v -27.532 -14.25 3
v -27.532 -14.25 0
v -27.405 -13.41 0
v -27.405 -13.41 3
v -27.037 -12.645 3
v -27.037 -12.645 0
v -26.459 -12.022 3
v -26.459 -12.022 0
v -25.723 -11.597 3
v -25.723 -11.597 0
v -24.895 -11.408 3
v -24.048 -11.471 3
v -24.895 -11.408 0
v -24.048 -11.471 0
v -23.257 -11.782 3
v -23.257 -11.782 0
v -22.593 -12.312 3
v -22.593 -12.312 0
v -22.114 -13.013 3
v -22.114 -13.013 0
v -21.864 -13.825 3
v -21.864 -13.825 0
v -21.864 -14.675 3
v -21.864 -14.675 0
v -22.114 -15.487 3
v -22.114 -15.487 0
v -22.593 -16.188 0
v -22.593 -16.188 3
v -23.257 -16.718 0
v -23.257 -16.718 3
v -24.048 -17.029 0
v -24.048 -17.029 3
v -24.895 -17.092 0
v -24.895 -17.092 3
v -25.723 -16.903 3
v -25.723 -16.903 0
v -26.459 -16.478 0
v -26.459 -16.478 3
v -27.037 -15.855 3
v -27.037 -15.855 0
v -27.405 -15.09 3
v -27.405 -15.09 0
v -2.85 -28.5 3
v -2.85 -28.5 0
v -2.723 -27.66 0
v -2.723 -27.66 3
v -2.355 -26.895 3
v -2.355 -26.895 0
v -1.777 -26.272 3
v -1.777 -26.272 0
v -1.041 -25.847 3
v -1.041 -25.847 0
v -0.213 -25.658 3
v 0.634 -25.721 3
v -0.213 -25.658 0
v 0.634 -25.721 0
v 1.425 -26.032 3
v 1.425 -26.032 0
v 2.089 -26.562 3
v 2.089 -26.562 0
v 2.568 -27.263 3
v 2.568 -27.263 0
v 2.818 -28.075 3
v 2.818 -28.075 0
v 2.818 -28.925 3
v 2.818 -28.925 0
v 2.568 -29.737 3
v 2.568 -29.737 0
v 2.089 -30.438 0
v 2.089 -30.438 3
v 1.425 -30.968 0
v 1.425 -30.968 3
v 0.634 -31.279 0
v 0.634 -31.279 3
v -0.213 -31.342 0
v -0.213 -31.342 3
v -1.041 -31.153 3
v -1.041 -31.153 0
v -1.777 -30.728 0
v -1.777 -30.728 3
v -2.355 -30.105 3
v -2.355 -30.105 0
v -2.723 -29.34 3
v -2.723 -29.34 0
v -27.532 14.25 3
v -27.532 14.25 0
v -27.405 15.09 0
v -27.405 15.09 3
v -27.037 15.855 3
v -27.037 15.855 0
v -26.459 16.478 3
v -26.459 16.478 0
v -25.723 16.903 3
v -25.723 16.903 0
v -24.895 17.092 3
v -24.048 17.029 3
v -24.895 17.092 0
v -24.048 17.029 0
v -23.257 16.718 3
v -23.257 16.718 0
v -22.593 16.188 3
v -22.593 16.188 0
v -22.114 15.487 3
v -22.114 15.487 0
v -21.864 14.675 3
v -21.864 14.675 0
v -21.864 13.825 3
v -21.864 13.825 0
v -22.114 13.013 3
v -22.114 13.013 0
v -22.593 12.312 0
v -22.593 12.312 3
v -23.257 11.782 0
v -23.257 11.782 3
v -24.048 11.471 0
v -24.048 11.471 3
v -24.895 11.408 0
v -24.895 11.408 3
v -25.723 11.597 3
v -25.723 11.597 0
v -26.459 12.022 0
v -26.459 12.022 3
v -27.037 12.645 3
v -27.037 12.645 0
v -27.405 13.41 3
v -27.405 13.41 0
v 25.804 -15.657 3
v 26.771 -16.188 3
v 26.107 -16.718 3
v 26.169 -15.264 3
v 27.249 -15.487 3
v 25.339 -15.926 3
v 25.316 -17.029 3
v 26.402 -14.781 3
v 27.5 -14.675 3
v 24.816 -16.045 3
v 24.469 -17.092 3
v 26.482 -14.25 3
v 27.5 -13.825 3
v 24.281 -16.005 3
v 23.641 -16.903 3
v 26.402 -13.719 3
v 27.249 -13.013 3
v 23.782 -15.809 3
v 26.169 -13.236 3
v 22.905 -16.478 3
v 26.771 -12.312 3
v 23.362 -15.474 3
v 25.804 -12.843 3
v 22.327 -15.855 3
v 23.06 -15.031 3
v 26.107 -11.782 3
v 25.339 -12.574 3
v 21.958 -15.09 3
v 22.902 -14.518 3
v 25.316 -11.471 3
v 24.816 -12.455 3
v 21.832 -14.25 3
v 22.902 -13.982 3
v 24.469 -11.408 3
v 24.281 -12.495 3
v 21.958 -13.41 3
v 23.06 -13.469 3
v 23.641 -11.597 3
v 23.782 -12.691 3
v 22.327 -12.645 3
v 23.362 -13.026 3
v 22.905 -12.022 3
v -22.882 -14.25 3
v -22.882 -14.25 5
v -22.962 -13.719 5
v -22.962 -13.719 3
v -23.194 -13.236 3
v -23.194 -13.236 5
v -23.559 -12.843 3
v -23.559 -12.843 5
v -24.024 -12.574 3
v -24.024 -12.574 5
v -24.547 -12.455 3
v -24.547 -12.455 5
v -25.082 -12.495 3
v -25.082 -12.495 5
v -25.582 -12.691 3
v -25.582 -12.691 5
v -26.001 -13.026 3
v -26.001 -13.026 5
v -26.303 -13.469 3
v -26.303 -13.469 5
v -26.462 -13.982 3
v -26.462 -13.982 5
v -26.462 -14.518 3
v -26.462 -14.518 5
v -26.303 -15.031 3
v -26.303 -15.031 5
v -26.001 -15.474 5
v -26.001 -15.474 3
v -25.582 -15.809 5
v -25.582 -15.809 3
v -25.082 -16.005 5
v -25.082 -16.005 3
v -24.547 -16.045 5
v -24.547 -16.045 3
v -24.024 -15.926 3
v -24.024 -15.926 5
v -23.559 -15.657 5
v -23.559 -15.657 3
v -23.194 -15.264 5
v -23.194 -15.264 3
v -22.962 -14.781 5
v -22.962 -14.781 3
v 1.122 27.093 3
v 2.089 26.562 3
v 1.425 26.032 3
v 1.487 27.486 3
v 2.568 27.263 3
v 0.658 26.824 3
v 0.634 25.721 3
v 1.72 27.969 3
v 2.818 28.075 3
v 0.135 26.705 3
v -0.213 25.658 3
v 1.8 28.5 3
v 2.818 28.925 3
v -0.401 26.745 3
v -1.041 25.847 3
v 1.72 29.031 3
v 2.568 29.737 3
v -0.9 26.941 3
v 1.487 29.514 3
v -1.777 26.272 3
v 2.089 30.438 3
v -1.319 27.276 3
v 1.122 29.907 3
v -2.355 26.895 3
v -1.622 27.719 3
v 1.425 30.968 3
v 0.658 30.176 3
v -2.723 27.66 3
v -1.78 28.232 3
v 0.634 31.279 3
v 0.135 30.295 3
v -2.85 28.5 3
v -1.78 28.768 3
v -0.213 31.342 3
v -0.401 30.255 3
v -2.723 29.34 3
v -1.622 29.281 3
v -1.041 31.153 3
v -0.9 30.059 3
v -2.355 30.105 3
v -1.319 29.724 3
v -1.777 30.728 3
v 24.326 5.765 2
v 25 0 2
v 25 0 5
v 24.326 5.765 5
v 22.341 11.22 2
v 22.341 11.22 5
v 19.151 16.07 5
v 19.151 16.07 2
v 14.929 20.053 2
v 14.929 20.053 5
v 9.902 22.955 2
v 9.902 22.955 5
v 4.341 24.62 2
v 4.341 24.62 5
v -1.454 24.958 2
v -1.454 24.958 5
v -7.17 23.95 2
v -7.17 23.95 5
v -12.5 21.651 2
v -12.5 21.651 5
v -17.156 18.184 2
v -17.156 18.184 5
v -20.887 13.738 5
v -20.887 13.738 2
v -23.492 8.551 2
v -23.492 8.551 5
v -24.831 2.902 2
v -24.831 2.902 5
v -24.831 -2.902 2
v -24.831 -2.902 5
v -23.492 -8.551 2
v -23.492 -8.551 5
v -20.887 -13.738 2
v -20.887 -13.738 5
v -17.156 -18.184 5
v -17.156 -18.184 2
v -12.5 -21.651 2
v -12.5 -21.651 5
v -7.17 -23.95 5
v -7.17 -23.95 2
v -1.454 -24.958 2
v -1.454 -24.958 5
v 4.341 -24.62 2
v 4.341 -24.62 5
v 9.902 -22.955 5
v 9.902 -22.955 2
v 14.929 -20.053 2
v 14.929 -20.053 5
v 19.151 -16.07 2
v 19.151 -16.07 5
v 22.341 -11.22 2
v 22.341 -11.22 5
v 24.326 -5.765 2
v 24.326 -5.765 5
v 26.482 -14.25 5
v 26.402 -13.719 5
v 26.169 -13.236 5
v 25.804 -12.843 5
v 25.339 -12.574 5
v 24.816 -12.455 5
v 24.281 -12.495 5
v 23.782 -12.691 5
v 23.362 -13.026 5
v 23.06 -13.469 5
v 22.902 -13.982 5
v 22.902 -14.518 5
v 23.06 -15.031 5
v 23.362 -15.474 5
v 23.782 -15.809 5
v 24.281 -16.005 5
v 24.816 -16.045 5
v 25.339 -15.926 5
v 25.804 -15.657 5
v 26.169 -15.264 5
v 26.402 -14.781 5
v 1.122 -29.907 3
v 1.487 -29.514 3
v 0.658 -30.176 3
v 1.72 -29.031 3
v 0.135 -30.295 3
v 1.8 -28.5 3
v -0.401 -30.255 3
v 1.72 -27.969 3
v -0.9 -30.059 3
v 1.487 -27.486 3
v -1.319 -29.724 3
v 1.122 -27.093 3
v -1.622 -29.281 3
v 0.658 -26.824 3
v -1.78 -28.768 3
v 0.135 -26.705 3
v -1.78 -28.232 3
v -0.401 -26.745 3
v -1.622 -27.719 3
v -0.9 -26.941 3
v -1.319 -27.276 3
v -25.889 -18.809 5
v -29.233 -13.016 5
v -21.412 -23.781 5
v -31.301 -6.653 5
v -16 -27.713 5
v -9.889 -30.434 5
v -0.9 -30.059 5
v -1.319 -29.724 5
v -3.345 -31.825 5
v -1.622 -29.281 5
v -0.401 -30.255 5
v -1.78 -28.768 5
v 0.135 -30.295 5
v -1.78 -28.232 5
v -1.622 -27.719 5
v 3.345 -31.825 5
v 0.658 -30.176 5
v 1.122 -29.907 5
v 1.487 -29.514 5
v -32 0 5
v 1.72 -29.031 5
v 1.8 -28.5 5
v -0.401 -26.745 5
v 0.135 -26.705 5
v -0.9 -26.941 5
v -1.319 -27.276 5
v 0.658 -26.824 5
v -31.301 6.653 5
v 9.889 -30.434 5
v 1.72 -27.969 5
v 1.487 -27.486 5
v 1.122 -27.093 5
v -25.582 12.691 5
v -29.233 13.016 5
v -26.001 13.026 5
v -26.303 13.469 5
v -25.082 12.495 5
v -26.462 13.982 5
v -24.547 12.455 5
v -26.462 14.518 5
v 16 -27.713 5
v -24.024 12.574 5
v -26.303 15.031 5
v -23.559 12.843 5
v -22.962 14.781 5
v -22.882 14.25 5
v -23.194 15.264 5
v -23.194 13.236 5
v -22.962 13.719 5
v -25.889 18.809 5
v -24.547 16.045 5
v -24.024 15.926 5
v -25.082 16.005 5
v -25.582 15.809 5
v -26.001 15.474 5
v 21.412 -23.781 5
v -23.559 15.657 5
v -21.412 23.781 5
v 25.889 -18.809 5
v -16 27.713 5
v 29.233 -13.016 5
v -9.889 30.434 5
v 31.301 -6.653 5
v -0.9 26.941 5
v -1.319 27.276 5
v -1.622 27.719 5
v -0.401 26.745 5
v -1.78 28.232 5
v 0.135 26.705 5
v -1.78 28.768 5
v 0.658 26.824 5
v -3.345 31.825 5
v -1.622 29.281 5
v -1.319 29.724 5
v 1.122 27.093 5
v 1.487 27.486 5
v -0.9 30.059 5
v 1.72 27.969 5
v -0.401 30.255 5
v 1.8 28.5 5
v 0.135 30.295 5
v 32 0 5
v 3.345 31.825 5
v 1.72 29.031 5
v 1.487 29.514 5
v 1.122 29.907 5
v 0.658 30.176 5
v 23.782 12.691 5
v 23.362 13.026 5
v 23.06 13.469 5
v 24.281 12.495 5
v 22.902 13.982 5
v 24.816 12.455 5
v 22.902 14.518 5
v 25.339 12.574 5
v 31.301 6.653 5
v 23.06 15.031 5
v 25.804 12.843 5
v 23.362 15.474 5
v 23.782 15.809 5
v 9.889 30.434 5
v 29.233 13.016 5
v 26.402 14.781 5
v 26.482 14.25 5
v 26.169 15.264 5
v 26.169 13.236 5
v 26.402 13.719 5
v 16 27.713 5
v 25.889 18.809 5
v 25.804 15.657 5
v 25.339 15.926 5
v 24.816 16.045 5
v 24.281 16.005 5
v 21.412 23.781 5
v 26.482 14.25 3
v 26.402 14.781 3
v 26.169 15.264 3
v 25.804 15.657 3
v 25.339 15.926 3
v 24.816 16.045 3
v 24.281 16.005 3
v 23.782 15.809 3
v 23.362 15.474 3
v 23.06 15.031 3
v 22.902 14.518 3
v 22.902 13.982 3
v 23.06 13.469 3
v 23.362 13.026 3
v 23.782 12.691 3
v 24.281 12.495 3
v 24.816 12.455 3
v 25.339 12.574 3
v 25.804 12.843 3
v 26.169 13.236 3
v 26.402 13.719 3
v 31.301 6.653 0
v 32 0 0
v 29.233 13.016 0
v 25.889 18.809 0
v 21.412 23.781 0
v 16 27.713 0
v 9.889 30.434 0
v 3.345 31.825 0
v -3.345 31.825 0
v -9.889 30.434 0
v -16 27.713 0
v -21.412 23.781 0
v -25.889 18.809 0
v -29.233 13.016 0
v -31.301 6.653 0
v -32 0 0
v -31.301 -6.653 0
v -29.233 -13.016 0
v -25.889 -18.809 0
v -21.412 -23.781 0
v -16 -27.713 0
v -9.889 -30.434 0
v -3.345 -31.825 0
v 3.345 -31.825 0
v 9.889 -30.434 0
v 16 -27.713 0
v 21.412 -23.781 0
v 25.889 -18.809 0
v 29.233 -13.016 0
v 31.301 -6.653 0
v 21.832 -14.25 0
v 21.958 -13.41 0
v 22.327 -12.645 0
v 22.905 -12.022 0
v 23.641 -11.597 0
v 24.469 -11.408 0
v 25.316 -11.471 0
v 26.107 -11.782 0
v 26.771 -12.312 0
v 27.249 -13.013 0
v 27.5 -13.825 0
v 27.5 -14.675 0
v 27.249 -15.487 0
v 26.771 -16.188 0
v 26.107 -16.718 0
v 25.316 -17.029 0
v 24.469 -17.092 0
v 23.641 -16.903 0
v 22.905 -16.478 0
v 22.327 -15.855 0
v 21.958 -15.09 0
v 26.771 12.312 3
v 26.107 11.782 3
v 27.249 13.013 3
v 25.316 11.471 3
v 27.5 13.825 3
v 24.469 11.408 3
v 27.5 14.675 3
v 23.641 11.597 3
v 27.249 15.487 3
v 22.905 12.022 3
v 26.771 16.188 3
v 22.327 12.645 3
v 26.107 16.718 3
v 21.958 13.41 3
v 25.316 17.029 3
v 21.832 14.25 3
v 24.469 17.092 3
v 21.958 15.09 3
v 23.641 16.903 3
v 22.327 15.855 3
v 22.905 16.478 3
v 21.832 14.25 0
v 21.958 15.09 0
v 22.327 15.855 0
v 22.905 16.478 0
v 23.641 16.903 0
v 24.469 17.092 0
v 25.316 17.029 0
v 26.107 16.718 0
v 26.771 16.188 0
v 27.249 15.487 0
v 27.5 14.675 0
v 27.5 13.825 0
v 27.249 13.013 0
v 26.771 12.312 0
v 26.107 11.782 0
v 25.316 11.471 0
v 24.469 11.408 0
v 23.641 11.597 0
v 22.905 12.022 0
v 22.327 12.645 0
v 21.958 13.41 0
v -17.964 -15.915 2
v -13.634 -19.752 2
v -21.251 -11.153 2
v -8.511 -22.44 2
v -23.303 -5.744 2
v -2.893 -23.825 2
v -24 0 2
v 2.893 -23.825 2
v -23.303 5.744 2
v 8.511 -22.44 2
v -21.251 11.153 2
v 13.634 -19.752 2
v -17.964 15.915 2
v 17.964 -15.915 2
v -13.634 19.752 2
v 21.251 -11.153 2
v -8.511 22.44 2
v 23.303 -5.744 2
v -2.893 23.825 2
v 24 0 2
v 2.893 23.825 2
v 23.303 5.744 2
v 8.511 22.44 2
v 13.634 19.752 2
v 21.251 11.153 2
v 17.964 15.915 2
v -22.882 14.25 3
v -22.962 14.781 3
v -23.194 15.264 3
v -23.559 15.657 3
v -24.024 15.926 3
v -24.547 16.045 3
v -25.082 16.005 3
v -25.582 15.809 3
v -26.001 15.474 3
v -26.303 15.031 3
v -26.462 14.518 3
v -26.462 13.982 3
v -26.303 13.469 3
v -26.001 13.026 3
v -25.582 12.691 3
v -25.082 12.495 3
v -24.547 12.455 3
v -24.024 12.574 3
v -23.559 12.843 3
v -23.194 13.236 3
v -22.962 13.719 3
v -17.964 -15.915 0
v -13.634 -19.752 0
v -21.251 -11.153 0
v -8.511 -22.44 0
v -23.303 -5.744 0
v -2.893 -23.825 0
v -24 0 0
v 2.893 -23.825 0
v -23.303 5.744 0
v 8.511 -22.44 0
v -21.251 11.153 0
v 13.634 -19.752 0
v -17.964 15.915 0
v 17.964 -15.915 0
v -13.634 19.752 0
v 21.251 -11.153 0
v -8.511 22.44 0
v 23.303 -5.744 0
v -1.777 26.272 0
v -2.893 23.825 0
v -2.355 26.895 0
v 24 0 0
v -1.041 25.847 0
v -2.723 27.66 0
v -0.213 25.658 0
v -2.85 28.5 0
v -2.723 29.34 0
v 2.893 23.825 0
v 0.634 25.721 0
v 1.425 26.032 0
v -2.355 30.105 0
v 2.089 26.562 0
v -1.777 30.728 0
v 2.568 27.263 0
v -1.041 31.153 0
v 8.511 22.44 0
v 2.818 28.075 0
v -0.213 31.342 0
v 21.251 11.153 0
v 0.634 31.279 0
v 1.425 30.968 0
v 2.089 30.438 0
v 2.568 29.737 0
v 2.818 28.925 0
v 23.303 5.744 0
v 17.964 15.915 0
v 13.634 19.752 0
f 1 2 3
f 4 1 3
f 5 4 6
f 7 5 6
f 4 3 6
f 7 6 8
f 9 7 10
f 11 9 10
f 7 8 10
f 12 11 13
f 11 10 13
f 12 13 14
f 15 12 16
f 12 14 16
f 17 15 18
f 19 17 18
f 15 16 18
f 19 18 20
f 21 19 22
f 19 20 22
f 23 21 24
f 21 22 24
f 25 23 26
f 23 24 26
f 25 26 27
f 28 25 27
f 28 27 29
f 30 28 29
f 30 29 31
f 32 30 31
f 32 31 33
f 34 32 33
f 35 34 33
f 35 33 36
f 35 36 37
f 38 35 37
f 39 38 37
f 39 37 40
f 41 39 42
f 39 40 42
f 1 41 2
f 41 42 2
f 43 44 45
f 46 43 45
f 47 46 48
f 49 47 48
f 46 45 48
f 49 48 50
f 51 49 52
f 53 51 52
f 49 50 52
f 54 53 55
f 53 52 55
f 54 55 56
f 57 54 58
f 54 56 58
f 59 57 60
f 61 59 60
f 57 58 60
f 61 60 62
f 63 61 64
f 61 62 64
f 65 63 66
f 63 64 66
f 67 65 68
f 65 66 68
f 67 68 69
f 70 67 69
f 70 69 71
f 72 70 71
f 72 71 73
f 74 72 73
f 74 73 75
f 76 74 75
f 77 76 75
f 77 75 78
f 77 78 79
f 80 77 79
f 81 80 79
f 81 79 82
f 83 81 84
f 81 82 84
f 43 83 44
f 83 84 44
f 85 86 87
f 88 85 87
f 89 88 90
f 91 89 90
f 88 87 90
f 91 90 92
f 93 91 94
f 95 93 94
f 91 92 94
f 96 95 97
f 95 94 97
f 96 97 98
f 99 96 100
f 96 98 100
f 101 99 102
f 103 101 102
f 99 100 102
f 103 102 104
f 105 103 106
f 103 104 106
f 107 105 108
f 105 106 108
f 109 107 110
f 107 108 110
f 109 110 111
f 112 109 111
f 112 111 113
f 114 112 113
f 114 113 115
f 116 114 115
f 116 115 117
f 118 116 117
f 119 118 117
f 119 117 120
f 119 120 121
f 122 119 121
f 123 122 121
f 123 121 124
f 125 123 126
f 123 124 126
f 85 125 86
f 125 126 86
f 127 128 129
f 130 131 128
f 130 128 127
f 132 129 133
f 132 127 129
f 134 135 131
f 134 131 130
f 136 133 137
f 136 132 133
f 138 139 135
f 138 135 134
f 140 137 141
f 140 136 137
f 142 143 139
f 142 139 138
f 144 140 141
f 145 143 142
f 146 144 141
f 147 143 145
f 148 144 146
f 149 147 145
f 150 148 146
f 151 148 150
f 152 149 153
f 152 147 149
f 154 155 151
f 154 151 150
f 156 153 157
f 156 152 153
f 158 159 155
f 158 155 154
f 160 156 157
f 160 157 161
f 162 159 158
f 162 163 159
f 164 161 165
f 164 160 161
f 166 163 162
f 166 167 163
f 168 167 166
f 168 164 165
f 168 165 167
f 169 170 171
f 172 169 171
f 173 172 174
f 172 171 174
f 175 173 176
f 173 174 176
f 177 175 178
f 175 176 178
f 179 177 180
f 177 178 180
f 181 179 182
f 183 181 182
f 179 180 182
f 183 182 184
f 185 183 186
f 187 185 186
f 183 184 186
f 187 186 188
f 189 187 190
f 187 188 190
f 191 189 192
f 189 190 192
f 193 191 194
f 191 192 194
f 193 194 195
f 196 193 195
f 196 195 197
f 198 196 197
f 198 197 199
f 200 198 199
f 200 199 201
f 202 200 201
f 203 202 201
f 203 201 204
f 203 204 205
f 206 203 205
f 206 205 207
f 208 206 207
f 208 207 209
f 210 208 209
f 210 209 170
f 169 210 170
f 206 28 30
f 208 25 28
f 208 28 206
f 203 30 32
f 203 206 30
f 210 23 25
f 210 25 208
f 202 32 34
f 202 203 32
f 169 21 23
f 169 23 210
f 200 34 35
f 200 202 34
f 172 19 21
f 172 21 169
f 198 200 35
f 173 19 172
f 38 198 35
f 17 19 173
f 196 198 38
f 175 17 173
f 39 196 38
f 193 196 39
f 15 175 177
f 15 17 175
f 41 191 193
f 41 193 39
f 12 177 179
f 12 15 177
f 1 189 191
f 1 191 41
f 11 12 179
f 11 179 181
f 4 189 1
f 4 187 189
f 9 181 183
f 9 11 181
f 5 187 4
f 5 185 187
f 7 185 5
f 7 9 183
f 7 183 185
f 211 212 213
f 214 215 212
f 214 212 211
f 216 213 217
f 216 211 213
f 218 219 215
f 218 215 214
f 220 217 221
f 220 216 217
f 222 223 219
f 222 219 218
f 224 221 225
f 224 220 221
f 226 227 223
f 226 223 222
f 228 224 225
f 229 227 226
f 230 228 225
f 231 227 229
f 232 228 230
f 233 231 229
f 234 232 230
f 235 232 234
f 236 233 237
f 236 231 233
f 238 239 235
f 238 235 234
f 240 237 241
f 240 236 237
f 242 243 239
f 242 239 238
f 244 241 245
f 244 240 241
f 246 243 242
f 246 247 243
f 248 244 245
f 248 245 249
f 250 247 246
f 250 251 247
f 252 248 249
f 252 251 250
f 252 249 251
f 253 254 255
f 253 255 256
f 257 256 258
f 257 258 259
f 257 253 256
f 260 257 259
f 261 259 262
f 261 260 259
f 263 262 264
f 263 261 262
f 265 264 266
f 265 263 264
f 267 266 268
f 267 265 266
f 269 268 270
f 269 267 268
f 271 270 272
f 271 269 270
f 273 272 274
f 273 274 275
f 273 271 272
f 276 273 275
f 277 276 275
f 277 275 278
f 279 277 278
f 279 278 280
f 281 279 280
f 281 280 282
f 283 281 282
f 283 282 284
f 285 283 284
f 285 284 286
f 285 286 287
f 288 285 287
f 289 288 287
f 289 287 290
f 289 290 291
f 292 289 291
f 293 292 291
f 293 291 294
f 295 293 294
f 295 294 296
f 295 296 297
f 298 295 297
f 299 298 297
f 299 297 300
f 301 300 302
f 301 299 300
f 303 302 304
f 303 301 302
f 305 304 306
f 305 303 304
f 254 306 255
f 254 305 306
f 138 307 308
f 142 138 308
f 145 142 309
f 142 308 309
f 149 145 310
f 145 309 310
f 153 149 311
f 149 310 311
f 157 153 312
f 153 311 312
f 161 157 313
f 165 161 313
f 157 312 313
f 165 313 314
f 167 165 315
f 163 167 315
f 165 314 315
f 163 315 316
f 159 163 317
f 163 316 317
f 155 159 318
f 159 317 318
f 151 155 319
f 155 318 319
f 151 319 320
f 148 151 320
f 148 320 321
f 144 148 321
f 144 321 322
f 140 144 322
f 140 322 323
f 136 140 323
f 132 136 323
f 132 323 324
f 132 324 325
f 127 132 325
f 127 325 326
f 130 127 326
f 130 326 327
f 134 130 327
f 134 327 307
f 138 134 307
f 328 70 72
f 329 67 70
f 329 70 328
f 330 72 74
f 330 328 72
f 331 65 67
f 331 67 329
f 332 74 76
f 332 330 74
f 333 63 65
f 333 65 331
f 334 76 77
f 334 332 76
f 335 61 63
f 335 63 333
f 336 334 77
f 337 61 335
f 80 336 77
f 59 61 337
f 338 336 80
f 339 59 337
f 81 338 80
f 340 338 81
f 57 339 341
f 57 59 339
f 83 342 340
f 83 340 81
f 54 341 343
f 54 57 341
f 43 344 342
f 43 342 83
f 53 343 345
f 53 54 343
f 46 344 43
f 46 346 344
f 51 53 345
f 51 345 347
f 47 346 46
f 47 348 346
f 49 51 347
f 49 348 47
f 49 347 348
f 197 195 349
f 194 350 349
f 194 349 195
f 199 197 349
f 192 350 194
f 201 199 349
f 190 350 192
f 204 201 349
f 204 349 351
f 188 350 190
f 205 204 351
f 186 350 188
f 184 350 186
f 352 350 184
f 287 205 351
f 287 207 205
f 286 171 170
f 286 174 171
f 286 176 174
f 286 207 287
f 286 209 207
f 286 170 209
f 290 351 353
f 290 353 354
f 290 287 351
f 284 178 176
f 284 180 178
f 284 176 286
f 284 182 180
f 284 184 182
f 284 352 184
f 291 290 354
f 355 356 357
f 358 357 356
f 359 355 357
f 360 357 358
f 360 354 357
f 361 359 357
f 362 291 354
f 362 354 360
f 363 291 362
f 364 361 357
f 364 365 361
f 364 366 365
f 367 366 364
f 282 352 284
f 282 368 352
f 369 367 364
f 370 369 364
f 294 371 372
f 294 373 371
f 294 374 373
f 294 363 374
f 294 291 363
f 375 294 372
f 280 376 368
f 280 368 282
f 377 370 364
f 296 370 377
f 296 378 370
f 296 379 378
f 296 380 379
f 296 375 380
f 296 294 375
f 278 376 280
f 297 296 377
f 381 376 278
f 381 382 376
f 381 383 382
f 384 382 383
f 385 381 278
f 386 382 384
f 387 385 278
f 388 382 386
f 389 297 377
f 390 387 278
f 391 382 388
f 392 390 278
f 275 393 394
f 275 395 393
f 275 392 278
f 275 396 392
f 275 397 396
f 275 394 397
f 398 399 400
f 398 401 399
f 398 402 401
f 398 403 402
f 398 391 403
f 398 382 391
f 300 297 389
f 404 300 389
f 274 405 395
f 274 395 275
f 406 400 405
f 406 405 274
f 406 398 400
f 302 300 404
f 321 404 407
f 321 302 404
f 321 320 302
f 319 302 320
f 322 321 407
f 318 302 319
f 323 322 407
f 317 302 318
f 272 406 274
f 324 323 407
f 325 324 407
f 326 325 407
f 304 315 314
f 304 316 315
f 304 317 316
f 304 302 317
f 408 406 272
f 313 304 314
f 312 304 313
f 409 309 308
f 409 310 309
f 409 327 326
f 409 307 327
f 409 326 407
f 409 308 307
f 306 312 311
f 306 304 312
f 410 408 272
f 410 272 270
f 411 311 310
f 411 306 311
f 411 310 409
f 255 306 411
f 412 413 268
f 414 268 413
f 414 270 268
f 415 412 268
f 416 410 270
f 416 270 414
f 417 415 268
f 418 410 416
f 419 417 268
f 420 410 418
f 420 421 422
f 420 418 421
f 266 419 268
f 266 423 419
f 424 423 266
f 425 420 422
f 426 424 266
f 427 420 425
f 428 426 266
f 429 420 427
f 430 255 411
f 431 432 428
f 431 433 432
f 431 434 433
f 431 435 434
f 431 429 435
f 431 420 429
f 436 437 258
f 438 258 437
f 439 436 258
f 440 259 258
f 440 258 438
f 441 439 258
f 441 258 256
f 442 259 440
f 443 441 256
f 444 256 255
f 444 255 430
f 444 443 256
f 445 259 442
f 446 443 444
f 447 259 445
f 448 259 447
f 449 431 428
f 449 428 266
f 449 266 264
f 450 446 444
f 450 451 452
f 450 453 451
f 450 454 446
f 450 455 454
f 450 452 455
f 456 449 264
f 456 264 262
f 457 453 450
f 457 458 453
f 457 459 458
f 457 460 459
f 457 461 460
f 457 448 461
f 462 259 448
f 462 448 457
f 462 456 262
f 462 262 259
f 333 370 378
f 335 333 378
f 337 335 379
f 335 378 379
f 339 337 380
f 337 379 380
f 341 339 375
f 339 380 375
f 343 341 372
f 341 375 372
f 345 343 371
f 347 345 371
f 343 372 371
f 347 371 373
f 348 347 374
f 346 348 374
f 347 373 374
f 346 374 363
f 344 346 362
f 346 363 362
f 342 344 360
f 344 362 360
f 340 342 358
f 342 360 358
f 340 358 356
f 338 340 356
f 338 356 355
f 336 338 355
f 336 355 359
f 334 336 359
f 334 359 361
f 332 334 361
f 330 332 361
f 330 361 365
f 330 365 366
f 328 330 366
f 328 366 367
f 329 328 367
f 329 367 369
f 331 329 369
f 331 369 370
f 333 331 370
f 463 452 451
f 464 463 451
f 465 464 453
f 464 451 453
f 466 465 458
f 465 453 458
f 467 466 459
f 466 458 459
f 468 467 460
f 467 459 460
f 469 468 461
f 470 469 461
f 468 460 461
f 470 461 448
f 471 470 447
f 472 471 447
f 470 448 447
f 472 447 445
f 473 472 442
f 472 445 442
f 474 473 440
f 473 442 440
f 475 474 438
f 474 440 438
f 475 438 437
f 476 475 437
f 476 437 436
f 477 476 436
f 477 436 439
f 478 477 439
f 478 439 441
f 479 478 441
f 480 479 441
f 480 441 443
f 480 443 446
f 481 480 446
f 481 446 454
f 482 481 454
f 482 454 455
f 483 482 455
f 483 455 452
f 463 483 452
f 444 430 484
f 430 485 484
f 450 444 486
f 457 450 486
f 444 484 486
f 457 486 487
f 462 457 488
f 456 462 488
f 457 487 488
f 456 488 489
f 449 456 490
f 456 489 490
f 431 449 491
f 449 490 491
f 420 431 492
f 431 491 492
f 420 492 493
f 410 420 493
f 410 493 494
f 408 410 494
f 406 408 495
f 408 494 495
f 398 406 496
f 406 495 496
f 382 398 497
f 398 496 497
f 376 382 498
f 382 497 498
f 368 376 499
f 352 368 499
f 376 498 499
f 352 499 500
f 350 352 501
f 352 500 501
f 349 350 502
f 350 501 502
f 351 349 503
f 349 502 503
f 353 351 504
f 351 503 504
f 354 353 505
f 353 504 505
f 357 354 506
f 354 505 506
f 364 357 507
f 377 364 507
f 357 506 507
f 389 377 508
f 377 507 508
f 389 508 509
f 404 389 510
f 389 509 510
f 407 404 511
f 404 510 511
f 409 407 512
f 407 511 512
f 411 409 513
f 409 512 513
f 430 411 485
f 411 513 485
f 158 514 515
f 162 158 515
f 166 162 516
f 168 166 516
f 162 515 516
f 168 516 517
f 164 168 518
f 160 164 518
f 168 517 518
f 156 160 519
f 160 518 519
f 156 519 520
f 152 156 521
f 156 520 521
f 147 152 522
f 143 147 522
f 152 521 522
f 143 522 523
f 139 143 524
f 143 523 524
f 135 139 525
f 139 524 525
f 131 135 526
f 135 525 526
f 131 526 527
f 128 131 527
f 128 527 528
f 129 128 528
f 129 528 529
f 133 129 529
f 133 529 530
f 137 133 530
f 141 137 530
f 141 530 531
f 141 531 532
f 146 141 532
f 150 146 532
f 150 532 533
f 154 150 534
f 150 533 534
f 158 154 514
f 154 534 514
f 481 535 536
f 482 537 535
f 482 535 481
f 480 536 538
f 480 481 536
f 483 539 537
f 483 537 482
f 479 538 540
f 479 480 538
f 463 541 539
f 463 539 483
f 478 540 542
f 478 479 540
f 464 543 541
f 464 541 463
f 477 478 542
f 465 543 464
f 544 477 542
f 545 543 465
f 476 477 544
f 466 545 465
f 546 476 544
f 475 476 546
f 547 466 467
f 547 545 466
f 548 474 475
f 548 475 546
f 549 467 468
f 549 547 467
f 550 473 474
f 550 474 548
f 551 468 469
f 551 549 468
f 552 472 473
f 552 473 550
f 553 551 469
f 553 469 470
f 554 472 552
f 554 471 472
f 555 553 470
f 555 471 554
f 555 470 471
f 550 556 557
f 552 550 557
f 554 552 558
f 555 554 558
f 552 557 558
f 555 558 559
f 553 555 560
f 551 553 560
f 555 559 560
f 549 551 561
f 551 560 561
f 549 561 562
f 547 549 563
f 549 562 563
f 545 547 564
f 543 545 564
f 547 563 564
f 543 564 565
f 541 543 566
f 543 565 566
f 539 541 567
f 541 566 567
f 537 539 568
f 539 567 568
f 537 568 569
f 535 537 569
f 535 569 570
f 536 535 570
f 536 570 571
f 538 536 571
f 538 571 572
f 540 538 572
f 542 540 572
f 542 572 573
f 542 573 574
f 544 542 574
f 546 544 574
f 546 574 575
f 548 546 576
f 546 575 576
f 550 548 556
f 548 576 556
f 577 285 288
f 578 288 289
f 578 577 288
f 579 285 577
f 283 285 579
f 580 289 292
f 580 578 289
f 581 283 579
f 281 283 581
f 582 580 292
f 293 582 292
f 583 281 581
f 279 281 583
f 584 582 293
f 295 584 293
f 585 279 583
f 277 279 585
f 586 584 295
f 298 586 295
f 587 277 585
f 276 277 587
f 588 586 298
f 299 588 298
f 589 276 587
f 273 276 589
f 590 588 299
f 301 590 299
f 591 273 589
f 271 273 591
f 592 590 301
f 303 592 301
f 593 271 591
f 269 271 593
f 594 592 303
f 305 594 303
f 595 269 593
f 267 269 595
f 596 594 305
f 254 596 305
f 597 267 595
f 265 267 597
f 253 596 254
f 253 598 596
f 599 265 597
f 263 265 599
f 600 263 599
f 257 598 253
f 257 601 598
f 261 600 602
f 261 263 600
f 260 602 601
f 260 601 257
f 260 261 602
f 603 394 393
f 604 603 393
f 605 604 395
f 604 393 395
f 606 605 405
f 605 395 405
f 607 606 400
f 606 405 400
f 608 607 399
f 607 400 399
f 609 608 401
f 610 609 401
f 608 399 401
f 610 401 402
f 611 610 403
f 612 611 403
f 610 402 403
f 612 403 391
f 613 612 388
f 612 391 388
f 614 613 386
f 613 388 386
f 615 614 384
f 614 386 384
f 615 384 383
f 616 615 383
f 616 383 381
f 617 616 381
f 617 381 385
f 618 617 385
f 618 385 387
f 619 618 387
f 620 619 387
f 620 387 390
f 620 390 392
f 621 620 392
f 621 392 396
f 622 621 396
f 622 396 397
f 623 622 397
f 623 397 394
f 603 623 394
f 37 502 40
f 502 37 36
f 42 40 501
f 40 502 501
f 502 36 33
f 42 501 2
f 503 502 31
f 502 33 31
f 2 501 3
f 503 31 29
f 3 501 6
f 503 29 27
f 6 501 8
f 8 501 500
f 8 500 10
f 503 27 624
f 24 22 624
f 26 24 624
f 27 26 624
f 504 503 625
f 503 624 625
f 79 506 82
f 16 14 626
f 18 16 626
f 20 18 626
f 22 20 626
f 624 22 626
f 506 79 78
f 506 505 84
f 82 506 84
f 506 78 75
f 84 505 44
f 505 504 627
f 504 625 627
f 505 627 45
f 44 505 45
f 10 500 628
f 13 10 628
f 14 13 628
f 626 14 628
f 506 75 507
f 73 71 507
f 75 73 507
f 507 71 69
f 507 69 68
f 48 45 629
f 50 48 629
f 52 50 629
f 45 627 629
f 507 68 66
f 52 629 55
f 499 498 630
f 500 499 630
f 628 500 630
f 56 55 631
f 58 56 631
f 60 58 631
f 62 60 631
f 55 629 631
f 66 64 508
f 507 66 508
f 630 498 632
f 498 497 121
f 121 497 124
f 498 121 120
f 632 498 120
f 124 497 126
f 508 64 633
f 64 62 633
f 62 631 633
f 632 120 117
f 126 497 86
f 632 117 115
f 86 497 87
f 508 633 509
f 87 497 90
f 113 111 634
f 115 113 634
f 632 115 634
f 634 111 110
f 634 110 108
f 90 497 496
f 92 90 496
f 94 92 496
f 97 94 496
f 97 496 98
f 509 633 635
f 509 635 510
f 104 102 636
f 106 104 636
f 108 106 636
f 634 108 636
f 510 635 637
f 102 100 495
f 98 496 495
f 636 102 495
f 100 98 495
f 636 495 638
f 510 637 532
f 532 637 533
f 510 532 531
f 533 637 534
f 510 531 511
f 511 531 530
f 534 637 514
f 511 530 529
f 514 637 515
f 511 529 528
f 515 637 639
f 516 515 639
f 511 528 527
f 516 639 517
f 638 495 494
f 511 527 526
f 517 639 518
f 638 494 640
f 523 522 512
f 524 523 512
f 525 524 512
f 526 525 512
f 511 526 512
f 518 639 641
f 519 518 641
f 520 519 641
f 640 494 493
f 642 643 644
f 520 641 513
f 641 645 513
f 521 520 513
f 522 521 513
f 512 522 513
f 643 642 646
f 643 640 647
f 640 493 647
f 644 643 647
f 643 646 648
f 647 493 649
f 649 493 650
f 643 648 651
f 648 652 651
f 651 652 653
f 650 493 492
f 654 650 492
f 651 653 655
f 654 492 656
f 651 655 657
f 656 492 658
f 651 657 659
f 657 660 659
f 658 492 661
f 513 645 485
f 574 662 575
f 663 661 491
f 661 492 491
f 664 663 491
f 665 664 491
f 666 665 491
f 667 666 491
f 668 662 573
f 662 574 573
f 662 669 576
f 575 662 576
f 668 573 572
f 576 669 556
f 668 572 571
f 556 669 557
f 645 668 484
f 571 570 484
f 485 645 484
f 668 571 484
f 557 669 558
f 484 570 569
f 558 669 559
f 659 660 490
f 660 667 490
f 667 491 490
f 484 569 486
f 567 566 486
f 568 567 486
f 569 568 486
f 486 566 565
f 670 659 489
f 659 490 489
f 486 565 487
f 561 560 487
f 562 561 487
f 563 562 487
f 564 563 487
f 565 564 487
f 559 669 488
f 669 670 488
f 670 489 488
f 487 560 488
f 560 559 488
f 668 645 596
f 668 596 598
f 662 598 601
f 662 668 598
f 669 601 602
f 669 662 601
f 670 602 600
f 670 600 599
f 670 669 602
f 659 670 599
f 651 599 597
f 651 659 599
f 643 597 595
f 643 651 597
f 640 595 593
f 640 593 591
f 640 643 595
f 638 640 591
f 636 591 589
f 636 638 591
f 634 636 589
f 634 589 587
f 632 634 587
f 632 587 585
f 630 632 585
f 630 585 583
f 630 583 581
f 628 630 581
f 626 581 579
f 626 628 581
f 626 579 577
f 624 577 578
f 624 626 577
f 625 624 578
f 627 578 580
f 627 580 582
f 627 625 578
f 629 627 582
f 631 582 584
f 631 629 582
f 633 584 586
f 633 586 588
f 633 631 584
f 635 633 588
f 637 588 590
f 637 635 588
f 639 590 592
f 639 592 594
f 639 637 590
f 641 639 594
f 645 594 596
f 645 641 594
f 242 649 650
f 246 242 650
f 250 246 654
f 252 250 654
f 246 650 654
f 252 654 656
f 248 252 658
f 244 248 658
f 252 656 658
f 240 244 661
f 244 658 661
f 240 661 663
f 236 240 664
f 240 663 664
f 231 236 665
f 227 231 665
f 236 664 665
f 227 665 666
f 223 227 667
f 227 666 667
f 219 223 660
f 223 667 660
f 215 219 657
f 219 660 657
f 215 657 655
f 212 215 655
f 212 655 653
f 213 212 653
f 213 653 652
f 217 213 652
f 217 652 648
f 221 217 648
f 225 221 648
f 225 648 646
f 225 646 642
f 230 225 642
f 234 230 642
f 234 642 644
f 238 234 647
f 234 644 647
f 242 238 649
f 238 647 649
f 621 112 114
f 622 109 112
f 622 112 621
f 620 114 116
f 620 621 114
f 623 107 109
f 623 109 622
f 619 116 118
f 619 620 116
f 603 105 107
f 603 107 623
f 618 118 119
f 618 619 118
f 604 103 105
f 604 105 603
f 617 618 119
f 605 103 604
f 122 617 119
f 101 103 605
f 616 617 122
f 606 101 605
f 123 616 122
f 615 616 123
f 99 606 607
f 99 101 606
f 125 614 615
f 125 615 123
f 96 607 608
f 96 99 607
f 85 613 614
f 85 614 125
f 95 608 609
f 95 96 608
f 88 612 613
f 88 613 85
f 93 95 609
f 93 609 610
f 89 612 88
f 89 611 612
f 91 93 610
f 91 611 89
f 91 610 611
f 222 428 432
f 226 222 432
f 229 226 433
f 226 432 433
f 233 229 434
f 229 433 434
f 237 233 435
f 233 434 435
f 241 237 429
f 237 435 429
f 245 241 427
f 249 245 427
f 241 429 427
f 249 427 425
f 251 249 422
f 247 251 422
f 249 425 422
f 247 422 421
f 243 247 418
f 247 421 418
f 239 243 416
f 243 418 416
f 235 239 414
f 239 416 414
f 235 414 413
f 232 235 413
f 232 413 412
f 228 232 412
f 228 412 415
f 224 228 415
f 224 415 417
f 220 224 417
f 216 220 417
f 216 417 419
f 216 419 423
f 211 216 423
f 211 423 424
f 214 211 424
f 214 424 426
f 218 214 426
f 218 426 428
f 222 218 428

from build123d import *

# Parameters (mm, degrees)
SKETCH_1_R          = 32
SKETCH_1_R_2        = 24
EXTRUDE_1_DEPTH     = 2
SKETCH_2_R          = 32
SKETCH_2_R_2        = 25
EXTRUDE_2_DEPTH     = 4
SKETCH_3_R          = 1.8
CUT_EXTRUDE_1_DEPTH = 46.650848842
SKETCH_4_R          = 2.85
CUT_EXTRUDE_2_DEPTH = 3
SKETCH_5_R          = 32
SKETCH_5_R_2        = 25
SKETCH_5_R_3        = 1.8
CUT_EXTRUDE_3_DEPTH = 1


with BuildPart() as part:
    # 草图1 → 凸台-拉伸1 (new body)
    with BuildSketch(Plane.XY):
        Circle(SKETCH_1_R)
        Circle(SKETCH_1_R_2, mode=Mode.SUBTRACT)
    extrude(amount=EXTRUDE_1_DEPTH)

    # 草图2 → 凸台-拉伸2 (add)
    with BuildSketch(Plane.XY.offset(2)):
        Circle(SKETCH_2_R)
        Circle(SKETCH_2_R_2, mode=Mode.SUBTRACT)
    extrude(amount=EXTRUDE_2_DEPTH)

    # 草图3 → 切除-拉伸1 (cut, through all)
    with BuildSketch(Plane.XY.offset(6)):
        with Locations((0, 28.5)):
            Circle(SKETCH_3_R)
        with Locations((24.681724008, 14.25)):
            Circle(SKETCH_3_R)
        with Locations((24.681724008, -14.25)):
            Circle(SKETCH_3_R)
        with Locations((0, -28.5)):
            Circle(SKETCH_3_R)
        with Locations((-24.681724008, -14.25)):
            Circle(SKETCH_3_R)
        with Locations((-24.681724008, 14.25)):
            Circle(SKETCH_3_R)
    extrude(amount=-CUT_EXTRUDE_1_DEPTH, mode=Mode.SUBTRACT)

    # 草图4 → 切除-拉伸2 (cut)
    with BuildSketch(Plane(origin=(0, 0, 0), x_dir=(-1, 0, 0), z_dir=(0, 0, -1))):
        with Locations((-24.681724008, -14.25)):
            Circle(SKETCH_4_R)
        with Locations((-24.681724008, 14.25)):
            Circle(SKETCH_4_R)
        with Locations((0, 28.5)):
            Circle(SKETCH_4_R)
        with Locations((24.681724008, 14.25)):
            Circle(SKETCH_4_R)
        with Locations((24.681724008, -14.25)):
            Circle(SKETCH_4_R)
        with Locations((0, -28.5)):
            Circle(SKETCH_4_R)
    extrude(amount=-CUT_EXTRUDE_2_DEPTH, mode=Mode.SUBTRACT)

    # 草图5 → 切除-拉伸3 (cut)
    with BuildSketch(Plane.XY.offset(6)):
        Circle(SKETCH_5_R)
        Circle(SKETCH_5_R_2, mode=Mode.SUBTRACT)
        with Locations((-24.681724008, 14.25)):
            Circle(SKETCH_5_R_3, mode=Mode.SUBTRACT)
        with Locations((0, 28.5)):
            Circle(SKETCH_5_R_3, mode=Mode.SUBTRACT)
        with Locations((24.681724008, 14.25)):
            Circle(SKETCH_5_R_3, mode=Mode.SUBTRACT)
        with Locations((24.681724008, -14.25)):
            Circle(SKETCH_5_R_3, mode=Mode.SUBTRACT)
        with Locations((0, -28.5)):
            Circle(SKETCH_5_R_3, mode=Mode.SUBTRACT)
        with Locations((-24.681724008, -14.25)):
            Circle(SKETCH_5_R_3, mode=Mode.SUBTRACT)
    extrude(amount=-CUT_EXTRUDE_3_DEPTH, mode=Mode.SUBTRACT)


solid = part.part
